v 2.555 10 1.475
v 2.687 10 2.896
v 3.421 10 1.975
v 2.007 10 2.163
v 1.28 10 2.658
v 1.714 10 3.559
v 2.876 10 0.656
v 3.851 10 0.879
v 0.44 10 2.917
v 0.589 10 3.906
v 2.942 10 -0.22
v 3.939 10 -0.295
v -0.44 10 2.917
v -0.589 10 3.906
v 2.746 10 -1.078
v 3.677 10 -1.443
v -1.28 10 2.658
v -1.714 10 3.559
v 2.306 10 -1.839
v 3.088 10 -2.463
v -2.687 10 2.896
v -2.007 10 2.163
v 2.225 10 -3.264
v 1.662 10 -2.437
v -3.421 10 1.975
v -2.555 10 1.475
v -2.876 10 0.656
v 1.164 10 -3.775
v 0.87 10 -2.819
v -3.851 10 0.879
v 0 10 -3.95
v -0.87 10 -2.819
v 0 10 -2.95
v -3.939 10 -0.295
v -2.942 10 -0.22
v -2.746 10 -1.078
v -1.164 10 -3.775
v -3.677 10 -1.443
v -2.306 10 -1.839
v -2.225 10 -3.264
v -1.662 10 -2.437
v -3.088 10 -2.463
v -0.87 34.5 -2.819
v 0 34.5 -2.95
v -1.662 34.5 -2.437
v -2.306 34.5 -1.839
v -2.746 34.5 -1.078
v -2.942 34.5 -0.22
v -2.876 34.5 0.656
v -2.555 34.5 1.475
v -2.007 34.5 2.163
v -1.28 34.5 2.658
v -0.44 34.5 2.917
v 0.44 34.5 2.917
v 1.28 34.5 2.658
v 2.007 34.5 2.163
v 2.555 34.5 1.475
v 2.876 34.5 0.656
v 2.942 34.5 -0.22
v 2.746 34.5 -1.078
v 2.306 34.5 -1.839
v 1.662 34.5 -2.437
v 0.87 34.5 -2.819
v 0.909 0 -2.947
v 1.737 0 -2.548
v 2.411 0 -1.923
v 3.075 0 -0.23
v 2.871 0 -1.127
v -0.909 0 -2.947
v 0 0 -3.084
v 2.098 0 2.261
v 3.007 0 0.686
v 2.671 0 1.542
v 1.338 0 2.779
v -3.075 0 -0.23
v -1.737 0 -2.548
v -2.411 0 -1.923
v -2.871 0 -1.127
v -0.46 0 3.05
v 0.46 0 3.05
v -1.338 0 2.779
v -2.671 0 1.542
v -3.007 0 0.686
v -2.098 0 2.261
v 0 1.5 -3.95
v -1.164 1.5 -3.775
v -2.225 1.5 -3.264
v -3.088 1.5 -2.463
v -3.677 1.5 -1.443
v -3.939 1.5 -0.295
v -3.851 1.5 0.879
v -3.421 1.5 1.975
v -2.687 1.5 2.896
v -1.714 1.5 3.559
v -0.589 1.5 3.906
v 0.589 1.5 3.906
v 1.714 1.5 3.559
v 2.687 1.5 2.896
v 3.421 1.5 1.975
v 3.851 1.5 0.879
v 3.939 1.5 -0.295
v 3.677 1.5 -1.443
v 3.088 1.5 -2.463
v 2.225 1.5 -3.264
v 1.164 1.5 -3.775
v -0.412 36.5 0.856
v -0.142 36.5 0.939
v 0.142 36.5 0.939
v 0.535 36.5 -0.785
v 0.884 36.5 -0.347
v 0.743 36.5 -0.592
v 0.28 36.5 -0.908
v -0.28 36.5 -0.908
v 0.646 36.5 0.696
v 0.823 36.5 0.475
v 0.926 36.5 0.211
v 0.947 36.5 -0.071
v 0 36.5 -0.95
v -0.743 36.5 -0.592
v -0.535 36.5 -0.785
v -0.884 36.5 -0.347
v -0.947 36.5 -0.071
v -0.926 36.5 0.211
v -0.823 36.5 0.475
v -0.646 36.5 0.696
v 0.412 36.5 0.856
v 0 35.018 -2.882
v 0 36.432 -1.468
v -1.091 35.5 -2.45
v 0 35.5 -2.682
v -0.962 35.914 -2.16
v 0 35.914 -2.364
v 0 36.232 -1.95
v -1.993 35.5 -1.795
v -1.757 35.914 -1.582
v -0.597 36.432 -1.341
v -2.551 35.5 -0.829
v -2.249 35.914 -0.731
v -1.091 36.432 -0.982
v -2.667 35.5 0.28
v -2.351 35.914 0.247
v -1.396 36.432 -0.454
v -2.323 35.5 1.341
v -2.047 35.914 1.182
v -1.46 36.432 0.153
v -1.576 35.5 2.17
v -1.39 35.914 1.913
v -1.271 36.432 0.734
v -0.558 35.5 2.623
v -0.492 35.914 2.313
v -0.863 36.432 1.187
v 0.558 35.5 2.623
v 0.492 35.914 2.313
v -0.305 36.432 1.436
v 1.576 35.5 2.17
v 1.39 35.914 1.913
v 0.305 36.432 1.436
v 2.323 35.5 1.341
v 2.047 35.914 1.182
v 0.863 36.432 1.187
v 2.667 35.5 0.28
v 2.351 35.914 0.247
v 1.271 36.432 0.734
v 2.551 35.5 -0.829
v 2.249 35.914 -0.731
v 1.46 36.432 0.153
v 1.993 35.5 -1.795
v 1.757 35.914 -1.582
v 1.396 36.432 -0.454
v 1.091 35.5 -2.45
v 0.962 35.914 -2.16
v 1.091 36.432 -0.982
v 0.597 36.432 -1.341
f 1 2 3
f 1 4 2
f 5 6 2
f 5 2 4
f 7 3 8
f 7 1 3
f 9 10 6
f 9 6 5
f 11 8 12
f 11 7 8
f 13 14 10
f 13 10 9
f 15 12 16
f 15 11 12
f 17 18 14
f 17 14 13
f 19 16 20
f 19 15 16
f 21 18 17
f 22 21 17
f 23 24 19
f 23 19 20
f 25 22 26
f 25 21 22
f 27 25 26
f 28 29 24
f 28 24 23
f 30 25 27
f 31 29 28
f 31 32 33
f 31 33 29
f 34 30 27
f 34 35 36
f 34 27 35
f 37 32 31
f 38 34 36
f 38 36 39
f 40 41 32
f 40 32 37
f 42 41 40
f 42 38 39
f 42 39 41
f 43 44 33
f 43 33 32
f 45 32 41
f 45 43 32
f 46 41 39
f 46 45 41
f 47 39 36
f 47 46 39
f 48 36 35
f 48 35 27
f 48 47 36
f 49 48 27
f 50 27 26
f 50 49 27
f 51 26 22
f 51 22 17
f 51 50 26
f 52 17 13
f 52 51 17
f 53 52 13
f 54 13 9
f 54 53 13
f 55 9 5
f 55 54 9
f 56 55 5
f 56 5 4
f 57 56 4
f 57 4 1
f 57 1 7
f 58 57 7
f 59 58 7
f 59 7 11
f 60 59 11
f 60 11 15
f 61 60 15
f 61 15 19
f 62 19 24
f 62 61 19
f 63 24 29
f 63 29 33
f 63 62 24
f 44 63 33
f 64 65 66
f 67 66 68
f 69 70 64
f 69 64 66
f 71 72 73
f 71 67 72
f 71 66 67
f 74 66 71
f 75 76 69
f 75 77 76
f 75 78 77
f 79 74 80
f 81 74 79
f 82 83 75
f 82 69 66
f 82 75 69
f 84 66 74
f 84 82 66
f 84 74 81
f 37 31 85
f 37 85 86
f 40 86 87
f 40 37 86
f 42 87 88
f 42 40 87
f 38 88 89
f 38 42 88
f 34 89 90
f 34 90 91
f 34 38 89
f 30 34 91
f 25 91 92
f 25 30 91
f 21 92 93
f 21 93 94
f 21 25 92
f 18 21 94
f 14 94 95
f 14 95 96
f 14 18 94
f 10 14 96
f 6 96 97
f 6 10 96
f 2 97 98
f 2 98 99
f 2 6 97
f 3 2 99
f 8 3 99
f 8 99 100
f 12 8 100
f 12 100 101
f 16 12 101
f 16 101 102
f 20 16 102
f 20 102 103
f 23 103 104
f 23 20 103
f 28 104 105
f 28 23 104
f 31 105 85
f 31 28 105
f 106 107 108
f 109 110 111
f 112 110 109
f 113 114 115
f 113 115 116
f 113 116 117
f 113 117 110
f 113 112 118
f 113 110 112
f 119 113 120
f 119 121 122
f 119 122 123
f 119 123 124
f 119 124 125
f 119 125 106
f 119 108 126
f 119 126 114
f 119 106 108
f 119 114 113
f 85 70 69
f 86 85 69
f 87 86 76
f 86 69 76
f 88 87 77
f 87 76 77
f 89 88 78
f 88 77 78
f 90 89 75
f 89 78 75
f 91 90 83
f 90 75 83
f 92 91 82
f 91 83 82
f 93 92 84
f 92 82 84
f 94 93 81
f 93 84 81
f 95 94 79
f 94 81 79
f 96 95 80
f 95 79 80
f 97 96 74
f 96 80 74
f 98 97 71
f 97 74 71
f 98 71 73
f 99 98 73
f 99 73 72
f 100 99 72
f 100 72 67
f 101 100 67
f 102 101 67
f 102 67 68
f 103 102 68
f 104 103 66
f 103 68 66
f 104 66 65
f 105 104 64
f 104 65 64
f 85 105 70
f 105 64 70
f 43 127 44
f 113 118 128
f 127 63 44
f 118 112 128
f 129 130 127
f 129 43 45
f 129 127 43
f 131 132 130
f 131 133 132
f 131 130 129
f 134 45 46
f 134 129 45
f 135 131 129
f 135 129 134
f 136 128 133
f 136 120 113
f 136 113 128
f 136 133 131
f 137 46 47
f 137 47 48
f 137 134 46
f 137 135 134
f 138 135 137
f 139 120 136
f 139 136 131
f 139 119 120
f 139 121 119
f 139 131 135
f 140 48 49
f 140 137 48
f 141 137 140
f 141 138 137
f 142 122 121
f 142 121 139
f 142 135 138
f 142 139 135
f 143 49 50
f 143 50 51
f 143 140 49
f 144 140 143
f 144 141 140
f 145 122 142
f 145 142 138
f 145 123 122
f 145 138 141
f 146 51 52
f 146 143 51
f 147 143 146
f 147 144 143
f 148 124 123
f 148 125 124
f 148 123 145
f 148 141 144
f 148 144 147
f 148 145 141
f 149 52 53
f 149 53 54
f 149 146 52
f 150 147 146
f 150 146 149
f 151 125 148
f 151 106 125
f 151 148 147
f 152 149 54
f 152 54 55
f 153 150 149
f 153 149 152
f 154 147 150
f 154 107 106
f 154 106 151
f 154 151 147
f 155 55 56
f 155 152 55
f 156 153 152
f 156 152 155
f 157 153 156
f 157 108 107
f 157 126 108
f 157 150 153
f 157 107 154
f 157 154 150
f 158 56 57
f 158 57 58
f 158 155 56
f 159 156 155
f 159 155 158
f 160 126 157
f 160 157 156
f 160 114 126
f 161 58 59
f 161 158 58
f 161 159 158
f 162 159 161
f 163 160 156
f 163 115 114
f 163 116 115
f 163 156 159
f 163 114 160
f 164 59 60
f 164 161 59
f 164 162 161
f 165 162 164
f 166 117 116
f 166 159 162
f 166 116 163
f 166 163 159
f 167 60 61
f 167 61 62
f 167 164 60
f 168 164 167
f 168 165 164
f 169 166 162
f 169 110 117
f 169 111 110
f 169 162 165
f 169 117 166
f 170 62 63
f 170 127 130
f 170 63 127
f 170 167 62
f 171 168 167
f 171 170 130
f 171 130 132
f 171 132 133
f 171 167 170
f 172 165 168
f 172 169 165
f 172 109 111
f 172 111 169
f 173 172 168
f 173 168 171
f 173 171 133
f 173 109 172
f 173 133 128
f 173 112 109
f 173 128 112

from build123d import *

# Parameters (mm, degrees)
FILLET1_R      = 2
CHAMFER2_SIZE  = 1.5
CHAMFER2_SIZE2 = 0.866025404


with BuildPart() as part:
    # Sketch4 → Revolve1 (revolve)
    with BuildSketch(Plane.XY, mode=Mode.PRIVATE) as revolve1_sk:
        Polygon((0, 0), (3.95, 0), (3.95, 10), (2.95, 10), (2.95, 36.5), (0, 36.5), align=None)
    revolve(revolve1_sk.sketch.rotate(Axis((0, 0, 0), (0, 1, 0)), 90), axis=Axis((0, 0, 0), (0, 1, 0)))

    # Fillet1
    fillet1_edges = [part.edges().sort_by_distance(p)[0] for p in [
        (0, 36.5, 2.95),
    ]]
    fillet(fillet1_edges, radius=FILLET1_R)

    # Chamfer2
    chamfer2_edges = [part.edges().sort_by_distance(p)[0] for p in [
        (0, 0, 3.95),
    ]]
    chamfer2_side = [part.faces().sort_by_distance(p)[0] for p in [
        (0, 5, 3.95),
    ]]
    chamfer(chamfer2_edges, length=CHAMFER2_SIZE, length2=CHAMFER2_SIZE2, reference=chamfer2_side[0])


solid = part.part
